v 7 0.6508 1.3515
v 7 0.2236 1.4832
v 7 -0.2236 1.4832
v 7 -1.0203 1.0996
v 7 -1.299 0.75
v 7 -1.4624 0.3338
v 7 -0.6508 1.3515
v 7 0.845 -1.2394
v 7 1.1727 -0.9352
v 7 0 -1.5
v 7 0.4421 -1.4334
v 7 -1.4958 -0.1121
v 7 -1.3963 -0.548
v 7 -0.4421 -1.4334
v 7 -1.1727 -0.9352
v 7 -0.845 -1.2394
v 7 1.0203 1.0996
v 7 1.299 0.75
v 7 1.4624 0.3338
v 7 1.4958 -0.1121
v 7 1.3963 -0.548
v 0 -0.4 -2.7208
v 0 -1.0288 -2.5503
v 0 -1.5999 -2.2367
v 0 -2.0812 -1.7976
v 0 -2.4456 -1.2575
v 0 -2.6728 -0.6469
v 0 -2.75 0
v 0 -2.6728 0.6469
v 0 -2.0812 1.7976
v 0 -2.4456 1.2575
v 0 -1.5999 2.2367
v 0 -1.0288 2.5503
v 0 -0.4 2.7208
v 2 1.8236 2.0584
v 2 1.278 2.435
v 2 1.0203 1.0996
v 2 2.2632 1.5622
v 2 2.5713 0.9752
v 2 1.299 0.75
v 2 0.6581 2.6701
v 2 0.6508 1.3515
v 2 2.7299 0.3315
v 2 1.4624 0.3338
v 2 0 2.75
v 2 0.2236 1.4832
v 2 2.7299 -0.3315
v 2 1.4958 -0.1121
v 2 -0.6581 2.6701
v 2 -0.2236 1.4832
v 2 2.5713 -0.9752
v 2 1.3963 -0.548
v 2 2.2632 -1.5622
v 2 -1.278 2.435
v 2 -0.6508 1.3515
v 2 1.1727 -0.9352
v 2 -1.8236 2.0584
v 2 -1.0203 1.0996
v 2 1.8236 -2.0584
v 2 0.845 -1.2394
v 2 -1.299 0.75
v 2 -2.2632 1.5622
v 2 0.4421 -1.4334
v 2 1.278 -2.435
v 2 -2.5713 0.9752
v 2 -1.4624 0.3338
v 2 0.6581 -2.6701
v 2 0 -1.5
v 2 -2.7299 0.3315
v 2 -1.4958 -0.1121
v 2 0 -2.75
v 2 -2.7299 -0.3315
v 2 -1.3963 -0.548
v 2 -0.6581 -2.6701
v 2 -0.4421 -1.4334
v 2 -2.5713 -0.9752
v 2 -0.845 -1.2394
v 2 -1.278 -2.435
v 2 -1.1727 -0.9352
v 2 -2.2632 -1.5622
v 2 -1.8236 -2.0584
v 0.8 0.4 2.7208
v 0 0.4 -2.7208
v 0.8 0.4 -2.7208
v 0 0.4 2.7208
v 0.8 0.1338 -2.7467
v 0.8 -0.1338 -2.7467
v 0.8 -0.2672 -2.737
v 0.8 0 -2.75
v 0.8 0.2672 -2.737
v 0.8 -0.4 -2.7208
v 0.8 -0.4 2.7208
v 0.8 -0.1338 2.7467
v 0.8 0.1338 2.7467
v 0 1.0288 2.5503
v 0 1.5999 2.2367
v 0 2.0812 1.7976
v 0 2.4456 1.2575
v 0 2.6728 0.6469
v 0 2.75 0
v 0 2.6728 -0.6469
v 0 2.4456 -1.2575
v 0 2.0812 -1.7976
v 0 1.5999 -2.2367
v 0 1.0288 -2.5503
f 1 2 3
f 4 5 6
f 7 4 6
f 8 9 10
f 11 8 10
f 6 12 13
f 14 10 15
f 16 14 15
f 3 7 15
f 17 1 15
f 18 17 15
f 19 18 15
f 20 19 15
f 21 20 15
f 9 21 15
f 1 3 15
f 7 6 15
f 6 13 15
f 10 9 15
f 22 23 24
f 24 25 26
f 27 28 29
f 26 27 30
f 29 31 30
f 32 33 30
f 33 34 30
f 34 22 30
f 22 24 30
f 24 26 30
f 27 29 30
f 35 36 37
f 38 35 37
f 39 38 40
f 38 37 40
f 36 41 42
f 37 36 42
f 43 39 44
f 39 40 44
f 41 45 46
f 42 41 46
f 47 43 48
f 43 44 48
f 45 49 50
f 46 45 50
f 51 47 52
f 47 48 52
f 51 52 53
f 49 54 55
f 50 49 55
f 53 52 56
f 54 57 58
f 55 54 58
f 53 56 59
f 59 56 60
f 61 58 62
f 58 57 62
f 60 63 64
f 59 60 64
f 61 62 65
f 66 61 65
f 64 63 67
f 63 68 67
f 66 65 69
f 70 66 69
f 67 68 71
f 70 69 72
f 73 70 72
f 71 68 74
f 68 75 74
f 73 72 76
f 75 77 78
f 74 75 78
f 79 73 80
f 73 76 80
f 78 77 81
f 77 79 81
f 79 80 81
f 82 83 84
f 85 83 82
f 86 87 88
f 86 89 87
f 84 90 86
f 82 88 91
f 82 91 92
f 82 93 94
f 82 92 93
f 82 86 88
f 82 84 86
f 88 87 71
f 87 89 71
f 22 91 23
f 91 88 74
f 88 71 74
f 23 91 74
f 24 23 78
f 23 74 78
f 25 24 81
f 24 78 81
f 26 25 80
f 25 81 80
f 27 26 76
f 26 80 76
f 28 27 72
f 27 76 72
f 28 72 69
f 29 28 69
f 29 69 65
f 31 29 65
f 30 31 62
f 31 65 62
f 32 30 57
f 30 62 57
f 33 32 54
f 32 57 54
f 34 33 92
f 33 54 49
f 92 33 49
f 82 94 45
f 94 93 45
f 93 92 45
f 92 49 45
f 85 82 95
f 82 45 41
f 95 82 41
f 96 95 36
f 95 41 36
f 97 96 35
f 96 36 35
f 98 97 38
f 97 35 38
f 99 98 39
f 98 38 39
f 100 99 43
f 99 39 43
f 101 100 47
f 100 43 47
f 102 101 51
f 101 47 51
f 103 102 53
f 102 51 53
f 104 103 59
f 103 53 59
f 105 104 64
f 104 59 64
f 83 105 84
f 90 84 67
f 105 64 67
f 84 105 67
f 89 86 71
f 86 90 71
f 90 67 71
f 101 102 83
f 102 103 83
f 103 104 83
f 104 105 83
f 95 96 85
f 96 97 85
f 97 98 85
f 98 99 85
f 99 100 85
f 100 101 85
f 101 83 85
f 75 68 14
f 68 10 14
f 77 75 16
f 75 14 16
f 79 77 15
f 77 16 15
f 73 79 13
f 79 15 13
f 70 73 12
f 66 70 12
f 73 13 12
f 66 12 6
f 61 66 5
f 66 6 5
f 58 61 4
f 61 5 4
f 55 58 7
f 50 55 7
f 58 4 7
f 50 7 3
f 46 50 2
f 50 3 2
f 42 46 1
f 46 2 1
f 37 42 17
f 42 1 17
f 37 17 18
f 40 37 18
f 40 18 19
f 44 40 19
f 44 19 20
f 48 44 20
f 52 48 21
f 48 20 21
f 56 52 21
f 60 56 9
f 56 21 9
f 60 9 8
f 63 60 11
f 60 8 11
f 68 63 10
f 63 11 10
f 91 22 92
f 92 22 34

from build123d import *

# Parameters (mm, degrees)
SKETCH2_W          = 5.5
SKETCH2_H          = 0.8
CUT_EXTRUDE1_DEPTH = 0.8


with BuildPart() as part:
    # Sketch1 → Revolve1 (revolve)
    with BuildSketch(Plane.XY, mode=Mode.PRIVATE) as revolve1_sk:
        Polygon((0, 0), (0, 2.75), (2, 2.75), (2, 1.5), (7, 1.5), (7, 0), align=None)
    revolve(revolve1_sk.sketch.rotate(Axis((7, 0, 0), (-1, 0, 0)), 90), axis=Axis((7, 0, 0), (-1, 0, 0)))

    # Sketch2 → Cut-Extrude1 (cut)
    with BuildSketch(Plane.ZY):
        Rectangle(SKETCH2_W, SKETCH2_H)
    extrude(amount=-CUT_EXTRUDE1_DEPTH, mode=Mode.SUBTRACT)


solid = part.part
